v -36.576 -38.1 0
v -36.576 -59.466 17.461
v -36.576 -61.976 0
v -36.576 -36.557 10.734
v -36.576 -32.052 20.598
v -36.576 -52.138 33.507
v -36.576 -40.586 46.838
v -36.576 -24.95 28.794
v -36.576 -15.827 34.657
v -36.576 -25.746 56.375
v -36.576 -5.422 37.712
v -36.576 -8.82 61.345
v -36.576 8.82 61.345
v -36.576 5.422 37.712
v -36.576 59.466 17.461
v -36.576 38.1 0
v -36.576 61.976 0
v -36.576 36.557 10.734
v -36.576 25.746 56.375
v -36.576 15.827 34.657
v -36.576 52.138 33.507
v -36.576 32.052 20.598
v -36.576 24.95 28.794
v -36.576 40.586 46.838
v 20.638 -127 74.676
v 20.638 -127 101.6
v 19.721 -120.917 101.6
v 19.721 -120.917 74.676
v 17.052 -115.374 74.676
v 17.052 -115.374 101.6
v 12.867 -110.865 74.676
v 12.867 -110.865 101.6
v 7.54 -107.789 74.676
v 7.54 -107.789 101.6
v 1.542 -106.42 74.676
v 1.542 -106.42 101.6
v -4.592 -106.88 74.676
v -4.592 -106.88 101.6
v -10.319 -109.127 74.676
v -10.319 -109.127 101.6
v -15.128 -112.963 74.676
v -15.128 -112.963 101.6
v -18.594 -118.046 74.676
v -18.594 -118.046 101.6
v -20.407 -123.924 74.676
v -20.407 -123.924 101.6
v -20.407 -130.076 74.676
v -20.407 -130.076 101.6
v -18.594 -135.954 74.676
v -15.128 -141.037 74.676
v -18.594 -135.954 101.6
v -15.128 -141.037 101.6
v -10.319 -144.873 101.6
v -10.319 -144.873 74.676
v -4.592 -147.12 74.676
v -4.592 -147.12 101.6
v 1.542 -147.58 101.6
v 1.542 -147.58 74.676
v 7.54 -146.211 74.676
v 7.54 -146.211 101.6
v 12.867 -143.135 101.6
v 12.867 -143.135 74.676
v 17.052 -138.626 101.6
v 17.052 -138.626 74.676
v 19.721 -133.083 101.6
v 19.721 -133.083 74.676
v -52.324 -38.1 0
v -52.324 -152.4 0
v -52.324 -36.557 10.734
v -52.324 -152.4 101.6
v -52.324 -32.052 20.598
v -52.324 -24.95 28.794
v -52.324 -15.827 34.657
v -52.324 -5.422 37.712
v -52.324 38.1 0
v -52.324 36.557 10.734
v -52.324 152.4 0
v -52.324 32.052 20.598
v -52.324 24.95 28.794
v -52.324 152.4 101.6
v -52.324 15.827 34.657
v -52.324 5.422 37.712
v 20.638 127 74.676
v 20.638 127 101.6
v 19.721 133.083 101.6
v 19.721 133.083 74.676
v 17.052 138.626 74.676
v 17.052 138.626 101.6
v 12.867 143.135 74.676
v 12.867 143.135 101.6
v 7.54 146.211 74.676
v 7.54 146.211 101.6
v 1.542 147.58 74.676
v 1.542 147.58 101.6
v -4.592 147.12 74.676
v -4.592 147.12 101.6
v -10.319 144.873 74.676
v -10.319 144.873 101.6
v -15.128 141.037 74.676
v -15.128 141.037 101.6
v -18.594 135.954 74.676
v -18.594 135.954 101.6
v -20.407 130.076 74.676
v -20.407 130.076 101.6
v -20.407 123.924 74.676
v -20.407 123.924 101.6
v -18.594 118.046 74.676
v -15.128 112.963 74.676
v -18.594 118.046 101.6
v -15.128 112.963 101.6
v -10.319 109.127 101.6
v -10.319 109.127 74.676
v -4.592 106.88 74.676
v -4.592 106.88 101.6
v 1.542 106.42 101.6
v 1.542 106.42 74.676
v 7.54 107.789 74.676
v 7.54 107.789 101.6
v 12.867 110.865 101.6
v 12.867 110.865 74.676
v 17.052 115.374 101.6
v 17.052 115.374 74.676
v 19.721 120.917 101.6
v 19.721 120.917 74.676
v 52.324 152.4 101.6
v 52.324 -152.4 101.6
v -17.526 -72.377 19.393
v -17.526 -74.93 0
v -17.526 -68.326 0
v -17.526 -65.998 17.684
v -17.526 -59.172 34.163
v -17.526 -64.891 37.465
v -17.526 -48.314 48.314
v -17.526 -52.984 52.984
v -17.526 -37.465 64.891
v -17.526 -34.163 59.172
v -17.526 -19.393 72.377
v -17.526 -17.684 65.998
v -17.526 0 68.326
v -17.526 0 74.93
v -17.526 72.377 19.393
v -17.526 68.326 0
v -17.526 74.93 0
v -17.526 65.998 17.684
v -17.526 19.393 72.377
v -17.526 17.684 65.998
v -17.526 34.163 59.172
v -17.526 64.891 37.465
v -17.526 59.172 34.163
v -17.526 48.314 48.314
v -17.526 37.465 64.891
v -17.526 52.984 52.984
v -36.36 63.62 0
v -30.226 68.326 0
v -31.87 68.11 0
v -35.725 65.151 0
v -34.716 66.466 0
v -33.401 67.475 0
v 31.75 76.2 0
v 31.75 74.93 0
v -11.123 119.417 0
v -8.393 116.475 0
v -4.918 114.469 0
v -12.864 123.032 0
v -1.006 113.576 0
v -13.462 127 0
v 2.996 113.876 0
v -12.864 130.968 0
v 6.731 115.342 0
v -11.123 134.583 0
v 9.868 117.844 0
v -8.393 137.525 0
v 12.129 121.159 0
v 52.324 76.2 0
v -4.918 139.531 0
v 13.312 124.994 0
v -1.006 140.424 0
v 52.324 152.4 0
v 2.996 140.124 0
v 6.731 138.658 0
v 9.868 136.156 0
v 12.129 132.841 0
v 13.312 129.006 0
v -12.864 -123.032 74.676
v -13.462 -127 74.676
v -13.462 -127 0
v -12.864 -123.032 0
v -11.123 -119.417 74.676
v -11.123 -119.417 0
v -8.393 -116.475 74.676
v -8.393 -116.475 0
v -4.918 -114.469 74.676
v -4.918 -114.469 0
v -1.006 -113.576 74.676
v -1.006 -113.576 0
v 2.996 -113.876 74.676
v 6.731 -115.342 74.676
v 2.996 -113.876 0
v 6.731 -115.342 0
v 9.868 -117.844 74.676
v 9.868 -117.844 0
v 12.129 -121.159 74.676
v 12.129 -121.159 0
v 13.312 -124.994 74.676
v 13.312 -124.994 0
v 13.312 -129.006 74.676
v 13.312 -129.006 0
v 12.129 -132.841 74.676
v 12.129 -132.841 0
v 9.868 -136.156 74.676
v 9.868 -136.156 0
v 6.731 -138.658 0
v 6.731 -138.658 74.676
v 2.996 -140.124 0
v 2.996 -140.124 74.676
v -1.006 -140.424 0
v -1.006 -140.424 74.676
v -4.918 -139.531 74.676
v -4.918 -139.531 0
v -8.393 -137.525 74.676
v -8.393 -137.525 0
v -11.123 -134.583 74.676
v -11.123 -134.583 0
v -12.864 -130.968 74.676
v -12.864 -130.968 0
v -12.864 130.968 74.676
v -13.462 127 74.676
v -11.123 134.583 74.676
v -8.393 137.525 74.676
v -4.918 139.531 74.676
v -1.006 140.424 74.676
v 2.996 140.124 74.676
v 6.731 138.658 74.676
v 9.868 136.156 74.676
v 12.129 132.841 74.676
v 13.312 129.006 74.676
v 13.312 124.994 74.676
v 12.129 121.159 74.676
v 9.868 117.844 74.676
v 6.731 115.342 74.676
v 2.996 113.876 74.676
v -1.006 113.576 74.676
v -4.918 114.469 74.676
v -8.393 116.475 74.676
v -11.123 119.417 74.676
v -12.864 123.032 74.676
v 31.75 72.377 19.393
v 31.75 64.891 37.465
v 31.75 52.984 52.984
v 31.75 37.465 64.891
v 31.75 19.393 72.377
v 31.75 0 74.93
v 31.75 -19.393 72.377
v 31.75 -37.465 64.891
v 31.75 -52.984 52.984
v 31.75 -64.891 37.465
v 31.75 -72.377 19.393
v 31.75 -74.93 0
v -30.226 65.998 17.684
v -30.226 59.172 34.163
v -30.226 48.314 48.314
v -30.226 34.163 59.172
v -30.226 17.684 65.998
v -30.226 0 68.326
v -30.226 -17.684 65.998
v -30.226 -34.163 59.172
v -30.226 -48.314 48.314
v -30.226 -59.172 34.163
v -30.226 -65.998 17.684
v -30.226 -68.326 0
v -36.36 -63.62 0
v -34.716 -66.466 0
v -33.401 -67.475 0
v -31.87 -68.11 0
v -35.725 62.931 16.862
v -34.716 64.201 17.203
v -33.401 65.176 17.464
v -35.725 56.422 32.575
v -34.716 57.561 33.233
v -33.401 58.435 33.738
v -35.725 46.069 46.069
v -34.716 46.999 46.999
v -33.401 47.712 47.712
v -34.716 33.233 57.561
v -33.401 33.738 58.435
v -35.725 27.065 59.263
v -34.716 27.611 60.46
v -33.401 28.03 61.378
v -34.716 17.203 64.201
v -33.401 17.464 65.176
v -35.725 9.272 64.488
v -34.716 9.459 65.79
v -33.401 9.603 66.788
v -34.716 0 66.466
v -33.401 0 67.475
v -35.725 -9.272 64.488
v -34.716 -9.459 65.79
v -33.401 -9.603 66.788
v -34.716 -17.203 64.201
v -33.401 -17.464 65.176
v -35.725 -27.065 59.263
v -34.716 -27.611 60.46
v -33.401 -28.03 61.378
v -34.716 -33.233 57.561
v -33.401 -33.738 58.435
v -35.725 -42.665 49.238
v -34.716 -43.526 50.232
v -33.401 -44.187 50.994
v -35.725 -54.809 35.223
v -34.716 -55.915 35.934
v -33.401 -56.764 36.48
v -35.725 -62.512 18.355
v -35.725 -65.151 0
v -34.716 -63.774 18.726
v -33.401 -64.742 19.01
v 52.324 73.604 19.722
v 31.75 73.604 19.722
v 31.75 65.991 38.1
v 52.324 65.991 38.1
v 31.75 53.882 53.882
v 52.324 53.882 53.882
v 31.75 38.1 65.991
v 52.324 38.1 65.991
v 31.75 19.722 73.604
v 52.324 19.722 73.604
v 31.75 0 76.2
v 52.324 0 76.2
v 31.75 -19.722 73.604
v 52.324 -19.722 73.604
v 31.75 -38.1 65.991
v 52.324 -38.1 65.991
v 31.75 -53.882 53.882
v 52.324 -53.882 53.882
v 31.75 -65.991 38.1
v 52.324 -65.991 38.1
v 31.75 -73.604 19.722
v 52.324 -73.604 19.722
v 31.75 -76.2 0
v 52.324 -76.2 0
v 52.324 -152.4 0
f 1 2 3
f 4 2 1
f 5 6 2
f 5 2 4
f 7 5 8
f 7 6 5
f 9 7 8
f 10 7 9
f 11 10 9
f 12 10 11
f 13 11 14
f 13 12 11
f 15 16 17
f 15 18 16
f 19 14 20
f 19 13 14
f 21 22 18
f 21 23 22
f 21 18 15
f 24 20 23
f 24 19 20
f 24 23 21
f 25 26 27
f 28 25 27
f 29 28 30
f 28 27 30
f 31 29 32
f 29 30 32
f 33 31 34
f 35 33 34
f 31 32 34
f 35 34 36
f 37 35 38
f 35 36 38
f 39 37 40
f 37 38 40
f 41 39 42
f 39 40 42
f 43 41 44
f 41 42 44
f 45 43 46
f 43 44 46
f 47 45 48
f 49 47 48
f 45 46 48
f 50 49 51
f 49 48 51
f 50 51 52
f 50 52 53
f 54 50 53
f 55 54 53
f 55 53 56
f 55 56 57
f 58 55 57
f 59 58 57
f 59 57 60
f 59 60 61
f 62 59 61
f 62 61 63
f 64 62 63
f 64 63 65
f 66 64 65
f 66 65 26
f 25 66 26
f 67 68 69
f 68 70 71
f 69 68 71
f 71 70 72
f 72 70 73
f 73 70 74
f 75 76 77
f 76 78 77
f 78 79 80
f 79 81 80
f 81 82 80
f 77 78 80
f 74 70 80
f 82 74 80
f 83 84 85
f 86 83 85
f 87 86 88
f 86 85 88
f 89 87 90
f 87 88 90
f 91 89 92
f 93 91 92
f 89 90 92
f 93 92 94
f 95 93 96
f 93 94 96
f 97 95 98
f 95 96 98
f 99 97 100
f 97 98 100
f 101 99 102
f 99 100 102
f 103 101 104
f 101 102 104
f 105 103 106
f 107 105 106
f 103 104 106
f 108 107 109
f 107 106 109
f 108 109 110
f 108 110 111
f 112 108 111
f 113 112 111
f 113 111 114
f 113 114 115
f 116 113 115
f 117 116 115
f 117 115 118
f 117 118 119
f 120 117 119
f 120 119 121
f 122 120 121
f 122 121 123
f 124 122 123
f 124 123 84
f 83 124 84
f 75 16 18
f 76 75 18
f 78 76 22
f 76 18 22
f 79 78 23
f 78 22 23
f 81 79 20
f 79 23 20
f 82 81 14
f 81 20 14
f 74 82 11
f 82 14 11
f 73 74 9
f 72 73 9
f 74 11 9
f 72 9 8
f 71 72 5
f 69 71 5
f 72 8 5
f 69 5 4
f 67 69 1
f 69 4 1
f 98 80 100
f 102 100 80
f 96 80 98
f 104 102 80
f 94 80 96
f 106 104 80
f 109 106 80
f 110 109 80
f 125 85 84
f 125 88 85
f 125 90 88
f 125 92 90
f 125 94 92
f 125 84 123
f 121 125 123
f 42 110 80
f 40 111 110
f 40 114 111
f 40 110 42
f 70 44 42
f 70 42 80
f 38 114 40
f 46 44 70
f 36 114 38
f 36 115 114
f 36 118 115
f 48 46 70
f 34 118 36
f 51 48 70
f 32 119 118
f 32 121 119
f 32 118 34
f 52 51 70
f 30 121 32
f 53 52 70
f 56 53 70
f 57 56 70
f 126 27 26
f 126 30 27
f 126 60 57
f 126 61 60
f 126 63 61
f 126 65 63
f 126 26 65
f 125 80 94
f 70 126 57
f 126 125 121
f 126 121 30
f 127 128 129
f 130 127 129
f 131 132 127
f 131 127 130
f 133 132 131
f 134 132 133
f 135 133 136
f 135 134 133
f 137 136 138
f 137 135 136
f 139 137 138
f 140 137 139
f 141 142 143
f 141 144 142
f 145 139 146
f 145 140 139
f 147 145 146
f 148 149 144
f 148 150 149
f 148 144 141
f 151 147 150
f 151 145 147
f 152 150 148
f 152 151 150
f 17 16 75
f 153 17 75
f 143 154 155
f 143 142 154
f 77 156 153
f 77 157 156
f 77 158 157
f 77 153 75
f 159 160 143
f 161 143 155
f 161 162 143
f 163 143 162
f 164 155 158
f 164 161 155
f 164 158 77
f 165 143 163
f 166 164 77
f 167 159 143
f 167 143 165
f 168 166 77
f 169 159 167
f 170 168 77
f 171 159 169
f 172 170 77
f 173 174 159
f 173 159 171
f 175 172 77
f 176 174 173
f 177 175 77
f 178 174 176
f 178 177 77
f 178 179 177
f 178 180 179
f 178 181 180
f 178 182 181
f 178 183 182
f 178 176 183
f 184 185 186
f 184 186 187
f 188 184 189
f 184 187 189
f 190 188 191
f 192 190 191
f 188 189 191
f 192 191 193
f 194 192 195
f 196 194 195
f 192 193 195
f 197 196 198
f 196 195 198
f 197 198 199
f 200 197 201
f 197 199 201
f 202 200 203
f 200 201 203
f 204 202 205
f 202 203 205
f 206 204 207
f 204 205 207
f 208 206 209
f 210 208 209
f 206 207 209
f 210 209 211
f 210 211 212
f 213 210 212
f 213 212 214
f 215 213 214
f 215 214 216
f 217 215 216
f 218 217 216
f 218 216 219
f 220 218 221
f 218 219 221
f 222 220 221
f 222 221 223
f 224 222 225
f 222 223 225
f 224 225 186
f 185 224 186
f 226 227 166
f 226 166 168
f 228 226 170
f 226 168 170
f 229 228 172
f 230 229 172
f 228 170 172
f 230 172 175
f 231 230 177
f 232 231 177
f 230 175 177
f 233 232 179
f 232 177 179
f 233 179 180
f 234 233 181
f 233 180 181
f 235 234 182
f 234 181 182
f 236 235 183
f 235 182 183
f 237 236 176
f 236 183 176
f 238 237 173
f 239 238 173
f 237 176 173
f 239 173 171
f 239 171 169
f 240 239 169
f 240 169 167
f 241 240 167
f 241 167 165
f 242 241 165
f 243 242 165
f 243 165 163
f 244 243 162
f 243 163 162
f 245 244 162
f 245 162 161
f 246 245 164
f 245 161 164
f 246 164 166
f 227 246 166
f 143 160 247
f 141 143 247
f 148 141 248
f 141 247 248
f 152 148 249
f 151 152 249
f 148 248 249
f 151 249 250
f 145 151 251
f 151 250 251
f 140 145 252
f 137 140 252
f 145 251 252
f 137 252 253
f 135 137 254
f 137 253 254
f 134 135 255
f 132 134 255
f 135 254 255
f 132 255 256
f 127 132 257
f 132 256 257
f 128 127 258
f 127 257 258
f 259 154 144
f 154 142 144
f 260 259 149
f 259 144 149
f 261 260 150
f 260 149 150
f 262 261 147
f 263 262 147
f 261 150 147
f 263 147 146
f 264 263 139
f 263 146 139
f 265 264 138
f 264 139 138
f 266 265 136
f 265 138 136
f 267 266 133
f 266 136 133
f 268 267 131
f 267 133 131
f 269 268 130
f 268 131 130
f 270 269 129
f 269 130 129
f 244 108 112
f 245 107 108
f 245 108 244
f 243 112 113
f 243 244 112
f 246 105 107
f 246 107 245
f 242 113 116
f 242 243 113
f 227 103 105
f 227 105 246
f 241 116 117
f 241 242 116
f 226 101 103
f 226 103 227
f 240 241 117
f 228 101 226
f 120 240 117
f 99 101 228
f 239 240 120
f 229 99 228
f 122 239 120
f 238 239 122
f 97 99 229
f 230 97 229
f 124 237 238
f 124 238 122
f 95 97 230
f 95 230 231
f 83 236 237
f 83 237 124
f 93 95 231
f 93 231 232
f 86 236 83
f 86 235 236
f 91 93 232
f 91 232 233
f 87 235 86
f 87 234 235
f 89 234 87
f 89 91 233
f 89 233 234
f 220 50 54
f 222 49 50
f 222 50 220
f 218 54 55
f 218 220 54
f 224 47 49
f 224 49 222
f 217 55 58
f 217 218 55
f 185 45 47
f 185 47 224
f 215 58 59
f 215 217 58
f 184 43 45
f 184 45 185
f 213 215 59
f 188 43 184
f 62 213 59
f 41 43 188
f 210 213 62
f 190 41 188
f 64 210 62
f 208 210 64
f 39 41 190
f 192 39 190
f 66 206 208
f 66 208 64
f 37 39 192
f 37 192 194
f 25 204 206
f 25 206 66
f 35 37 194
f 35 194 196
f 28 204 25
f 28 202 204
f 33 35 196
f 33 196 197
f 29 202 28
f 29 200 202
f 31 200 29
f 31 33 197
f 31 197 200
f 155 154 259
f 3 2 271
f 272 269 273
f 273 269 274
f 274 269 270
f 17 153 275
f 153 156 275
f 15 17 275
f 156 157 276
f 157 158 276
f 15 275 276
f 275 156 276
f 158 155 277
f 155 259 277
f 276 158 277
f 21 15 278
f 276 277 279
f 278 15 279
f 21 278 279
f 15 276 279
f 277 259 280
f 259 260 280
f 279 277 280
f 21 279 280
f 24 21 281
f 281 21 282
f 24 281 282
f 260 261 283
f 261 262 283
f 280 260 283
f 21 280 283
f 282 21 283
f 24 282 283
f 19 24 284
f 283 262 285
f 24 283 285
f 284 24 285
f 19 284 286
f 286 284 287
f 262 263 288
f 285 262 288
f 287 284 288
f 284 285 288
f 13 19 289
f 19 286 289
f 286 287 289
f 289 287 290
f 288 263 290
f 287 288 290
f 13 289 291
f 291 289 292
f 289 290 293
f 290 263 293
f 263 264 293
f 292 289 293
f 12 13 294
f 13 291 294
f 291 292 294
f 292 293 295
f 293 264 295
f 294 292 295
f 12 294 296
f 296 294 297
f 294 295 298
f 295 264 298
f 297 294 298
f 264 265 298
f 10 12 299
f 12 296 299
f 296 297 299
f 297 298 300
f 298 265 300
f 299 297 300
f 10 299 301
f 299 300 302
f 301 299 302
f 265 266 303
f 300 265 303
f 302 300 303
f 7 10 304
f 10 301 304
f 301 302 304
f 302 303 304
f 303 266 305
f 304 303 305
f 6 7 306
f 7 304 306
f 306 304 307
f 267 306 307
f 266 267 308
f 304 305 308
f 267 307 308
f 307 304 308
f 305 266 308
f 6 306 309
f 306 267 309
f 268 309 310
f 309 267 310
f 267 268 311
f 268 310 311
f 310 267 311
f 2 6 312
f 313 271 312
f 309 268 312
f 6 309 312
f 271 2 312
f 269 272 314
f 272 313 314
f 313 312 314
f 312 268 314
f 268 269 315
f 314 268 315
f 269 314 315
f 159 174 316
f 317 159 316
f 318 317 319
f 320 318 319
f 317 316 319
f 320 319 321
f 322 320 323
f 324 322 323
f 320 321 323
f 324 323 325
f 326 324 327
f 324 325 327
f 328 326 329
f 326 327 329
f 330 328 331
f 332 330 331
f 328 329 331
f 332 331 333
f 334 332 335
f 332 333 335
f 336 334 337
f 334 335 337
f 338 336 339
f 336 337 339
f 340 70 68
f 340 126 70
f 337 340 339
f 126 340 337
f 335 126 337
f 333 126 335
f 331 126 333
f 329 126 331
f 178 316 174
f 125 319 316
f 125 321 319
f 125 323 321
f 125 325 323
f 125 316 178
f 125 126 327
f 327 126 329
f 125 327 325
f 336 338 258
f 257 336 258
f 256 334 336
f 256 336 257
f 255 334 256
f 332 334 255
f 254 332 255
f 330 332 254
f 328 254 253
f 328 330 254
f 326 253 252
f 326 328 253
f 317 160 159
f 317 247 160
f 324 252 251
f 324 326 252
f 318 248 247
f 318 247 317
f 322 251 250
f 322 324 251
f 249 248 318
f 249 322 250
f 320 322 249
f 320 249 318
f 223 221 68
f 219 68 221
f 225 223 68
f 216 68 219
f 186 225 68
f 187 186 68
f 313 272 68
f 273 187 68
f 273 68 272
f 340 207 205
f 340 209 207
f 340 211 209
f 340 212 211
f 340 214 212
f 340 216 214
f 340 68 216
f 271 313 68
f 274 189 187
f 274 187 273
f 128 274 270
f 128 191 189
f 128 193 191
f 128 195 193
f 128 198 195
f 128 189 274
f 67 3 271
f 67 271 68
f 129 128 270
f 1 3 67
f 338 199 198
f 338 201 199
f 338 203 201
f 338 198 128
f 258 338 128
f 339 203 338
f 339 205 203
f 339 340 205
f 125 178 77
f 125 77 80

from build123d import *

# Parameters (mm, degrees)
F1_DEPTH        = 52.324
F2_R            = 38.1
F3_DEPTH        = 104.649
F4_R            = 68.326
F5_DEPTH        = 88.9
F6_R            = 6.35
F7_R            = 74.93
F8_DEPTH        = 69.85
F9_R            = 76.2
F10_DEPTH       = 20.574
F12_D           = 26.924
F12_CBORE_D     = 41.275
F12_CBORE_DEPTH = 26.924


with BuildPart() as f1:
    # F0 (on Right) → F1 (new body, symmetric)
    with BuildSketch(Plane.YZ):
        Polygon((-152.4, 0), (0, 0), (152.4, 0), (152.4, 101.6), (0, 101.6), (-152.4, 101.6), align=None)
    extrude(amount=F1_DEPTH, both=True)

    # F2 (on face) → F3 (cut, through all)
    with BuildSketch(Plane.YZ.offset(52.324)):
        Circle(F2_R)
    extrude(amount=-F3_DEPTH, mode=Mode.SUBTRACT)

    # F4 (on face) → F5 (cut)
    with BuildSketch(Plane.YZ.offset(52.324)):
        Circle(F4_R)
    extrude(amount=-F5_DEPTH, mode=Mode.SUBTRACT)

    # F6
    f6_edges = [f1.edges().sort_by_distance(p)[0] for p in [
        (-36.576, 0, 68.326),
    ]]
    fillet(f6_edges, radius=F6_R)

    # F7 (on face) → F8 (cut)
    with BuildSketch(Plane.YZ.offset(52.324)):
        Circle(F7_R)
    extrude(amount=-F8_DEPTH, mode=Mode.SUBTRACT)

    # F9 (on face) → F10 (cut)
    with BuildSketch(Plane.YZ.offset(52.324)):
        Circle(F9_R)
    extrude(amount=-F10_DEPTH, mode=Mode.SUBTRACT)

    # F12 (through all)
    with Locations(Plane.XY.offset(101.6)):
        with Locations((0, -127), (0, 127)):
            CounterBoreHole(F12_D / 2, F12_CBORE_D / 2, F12_CBORE_DEPTH)


solid = f1.part
